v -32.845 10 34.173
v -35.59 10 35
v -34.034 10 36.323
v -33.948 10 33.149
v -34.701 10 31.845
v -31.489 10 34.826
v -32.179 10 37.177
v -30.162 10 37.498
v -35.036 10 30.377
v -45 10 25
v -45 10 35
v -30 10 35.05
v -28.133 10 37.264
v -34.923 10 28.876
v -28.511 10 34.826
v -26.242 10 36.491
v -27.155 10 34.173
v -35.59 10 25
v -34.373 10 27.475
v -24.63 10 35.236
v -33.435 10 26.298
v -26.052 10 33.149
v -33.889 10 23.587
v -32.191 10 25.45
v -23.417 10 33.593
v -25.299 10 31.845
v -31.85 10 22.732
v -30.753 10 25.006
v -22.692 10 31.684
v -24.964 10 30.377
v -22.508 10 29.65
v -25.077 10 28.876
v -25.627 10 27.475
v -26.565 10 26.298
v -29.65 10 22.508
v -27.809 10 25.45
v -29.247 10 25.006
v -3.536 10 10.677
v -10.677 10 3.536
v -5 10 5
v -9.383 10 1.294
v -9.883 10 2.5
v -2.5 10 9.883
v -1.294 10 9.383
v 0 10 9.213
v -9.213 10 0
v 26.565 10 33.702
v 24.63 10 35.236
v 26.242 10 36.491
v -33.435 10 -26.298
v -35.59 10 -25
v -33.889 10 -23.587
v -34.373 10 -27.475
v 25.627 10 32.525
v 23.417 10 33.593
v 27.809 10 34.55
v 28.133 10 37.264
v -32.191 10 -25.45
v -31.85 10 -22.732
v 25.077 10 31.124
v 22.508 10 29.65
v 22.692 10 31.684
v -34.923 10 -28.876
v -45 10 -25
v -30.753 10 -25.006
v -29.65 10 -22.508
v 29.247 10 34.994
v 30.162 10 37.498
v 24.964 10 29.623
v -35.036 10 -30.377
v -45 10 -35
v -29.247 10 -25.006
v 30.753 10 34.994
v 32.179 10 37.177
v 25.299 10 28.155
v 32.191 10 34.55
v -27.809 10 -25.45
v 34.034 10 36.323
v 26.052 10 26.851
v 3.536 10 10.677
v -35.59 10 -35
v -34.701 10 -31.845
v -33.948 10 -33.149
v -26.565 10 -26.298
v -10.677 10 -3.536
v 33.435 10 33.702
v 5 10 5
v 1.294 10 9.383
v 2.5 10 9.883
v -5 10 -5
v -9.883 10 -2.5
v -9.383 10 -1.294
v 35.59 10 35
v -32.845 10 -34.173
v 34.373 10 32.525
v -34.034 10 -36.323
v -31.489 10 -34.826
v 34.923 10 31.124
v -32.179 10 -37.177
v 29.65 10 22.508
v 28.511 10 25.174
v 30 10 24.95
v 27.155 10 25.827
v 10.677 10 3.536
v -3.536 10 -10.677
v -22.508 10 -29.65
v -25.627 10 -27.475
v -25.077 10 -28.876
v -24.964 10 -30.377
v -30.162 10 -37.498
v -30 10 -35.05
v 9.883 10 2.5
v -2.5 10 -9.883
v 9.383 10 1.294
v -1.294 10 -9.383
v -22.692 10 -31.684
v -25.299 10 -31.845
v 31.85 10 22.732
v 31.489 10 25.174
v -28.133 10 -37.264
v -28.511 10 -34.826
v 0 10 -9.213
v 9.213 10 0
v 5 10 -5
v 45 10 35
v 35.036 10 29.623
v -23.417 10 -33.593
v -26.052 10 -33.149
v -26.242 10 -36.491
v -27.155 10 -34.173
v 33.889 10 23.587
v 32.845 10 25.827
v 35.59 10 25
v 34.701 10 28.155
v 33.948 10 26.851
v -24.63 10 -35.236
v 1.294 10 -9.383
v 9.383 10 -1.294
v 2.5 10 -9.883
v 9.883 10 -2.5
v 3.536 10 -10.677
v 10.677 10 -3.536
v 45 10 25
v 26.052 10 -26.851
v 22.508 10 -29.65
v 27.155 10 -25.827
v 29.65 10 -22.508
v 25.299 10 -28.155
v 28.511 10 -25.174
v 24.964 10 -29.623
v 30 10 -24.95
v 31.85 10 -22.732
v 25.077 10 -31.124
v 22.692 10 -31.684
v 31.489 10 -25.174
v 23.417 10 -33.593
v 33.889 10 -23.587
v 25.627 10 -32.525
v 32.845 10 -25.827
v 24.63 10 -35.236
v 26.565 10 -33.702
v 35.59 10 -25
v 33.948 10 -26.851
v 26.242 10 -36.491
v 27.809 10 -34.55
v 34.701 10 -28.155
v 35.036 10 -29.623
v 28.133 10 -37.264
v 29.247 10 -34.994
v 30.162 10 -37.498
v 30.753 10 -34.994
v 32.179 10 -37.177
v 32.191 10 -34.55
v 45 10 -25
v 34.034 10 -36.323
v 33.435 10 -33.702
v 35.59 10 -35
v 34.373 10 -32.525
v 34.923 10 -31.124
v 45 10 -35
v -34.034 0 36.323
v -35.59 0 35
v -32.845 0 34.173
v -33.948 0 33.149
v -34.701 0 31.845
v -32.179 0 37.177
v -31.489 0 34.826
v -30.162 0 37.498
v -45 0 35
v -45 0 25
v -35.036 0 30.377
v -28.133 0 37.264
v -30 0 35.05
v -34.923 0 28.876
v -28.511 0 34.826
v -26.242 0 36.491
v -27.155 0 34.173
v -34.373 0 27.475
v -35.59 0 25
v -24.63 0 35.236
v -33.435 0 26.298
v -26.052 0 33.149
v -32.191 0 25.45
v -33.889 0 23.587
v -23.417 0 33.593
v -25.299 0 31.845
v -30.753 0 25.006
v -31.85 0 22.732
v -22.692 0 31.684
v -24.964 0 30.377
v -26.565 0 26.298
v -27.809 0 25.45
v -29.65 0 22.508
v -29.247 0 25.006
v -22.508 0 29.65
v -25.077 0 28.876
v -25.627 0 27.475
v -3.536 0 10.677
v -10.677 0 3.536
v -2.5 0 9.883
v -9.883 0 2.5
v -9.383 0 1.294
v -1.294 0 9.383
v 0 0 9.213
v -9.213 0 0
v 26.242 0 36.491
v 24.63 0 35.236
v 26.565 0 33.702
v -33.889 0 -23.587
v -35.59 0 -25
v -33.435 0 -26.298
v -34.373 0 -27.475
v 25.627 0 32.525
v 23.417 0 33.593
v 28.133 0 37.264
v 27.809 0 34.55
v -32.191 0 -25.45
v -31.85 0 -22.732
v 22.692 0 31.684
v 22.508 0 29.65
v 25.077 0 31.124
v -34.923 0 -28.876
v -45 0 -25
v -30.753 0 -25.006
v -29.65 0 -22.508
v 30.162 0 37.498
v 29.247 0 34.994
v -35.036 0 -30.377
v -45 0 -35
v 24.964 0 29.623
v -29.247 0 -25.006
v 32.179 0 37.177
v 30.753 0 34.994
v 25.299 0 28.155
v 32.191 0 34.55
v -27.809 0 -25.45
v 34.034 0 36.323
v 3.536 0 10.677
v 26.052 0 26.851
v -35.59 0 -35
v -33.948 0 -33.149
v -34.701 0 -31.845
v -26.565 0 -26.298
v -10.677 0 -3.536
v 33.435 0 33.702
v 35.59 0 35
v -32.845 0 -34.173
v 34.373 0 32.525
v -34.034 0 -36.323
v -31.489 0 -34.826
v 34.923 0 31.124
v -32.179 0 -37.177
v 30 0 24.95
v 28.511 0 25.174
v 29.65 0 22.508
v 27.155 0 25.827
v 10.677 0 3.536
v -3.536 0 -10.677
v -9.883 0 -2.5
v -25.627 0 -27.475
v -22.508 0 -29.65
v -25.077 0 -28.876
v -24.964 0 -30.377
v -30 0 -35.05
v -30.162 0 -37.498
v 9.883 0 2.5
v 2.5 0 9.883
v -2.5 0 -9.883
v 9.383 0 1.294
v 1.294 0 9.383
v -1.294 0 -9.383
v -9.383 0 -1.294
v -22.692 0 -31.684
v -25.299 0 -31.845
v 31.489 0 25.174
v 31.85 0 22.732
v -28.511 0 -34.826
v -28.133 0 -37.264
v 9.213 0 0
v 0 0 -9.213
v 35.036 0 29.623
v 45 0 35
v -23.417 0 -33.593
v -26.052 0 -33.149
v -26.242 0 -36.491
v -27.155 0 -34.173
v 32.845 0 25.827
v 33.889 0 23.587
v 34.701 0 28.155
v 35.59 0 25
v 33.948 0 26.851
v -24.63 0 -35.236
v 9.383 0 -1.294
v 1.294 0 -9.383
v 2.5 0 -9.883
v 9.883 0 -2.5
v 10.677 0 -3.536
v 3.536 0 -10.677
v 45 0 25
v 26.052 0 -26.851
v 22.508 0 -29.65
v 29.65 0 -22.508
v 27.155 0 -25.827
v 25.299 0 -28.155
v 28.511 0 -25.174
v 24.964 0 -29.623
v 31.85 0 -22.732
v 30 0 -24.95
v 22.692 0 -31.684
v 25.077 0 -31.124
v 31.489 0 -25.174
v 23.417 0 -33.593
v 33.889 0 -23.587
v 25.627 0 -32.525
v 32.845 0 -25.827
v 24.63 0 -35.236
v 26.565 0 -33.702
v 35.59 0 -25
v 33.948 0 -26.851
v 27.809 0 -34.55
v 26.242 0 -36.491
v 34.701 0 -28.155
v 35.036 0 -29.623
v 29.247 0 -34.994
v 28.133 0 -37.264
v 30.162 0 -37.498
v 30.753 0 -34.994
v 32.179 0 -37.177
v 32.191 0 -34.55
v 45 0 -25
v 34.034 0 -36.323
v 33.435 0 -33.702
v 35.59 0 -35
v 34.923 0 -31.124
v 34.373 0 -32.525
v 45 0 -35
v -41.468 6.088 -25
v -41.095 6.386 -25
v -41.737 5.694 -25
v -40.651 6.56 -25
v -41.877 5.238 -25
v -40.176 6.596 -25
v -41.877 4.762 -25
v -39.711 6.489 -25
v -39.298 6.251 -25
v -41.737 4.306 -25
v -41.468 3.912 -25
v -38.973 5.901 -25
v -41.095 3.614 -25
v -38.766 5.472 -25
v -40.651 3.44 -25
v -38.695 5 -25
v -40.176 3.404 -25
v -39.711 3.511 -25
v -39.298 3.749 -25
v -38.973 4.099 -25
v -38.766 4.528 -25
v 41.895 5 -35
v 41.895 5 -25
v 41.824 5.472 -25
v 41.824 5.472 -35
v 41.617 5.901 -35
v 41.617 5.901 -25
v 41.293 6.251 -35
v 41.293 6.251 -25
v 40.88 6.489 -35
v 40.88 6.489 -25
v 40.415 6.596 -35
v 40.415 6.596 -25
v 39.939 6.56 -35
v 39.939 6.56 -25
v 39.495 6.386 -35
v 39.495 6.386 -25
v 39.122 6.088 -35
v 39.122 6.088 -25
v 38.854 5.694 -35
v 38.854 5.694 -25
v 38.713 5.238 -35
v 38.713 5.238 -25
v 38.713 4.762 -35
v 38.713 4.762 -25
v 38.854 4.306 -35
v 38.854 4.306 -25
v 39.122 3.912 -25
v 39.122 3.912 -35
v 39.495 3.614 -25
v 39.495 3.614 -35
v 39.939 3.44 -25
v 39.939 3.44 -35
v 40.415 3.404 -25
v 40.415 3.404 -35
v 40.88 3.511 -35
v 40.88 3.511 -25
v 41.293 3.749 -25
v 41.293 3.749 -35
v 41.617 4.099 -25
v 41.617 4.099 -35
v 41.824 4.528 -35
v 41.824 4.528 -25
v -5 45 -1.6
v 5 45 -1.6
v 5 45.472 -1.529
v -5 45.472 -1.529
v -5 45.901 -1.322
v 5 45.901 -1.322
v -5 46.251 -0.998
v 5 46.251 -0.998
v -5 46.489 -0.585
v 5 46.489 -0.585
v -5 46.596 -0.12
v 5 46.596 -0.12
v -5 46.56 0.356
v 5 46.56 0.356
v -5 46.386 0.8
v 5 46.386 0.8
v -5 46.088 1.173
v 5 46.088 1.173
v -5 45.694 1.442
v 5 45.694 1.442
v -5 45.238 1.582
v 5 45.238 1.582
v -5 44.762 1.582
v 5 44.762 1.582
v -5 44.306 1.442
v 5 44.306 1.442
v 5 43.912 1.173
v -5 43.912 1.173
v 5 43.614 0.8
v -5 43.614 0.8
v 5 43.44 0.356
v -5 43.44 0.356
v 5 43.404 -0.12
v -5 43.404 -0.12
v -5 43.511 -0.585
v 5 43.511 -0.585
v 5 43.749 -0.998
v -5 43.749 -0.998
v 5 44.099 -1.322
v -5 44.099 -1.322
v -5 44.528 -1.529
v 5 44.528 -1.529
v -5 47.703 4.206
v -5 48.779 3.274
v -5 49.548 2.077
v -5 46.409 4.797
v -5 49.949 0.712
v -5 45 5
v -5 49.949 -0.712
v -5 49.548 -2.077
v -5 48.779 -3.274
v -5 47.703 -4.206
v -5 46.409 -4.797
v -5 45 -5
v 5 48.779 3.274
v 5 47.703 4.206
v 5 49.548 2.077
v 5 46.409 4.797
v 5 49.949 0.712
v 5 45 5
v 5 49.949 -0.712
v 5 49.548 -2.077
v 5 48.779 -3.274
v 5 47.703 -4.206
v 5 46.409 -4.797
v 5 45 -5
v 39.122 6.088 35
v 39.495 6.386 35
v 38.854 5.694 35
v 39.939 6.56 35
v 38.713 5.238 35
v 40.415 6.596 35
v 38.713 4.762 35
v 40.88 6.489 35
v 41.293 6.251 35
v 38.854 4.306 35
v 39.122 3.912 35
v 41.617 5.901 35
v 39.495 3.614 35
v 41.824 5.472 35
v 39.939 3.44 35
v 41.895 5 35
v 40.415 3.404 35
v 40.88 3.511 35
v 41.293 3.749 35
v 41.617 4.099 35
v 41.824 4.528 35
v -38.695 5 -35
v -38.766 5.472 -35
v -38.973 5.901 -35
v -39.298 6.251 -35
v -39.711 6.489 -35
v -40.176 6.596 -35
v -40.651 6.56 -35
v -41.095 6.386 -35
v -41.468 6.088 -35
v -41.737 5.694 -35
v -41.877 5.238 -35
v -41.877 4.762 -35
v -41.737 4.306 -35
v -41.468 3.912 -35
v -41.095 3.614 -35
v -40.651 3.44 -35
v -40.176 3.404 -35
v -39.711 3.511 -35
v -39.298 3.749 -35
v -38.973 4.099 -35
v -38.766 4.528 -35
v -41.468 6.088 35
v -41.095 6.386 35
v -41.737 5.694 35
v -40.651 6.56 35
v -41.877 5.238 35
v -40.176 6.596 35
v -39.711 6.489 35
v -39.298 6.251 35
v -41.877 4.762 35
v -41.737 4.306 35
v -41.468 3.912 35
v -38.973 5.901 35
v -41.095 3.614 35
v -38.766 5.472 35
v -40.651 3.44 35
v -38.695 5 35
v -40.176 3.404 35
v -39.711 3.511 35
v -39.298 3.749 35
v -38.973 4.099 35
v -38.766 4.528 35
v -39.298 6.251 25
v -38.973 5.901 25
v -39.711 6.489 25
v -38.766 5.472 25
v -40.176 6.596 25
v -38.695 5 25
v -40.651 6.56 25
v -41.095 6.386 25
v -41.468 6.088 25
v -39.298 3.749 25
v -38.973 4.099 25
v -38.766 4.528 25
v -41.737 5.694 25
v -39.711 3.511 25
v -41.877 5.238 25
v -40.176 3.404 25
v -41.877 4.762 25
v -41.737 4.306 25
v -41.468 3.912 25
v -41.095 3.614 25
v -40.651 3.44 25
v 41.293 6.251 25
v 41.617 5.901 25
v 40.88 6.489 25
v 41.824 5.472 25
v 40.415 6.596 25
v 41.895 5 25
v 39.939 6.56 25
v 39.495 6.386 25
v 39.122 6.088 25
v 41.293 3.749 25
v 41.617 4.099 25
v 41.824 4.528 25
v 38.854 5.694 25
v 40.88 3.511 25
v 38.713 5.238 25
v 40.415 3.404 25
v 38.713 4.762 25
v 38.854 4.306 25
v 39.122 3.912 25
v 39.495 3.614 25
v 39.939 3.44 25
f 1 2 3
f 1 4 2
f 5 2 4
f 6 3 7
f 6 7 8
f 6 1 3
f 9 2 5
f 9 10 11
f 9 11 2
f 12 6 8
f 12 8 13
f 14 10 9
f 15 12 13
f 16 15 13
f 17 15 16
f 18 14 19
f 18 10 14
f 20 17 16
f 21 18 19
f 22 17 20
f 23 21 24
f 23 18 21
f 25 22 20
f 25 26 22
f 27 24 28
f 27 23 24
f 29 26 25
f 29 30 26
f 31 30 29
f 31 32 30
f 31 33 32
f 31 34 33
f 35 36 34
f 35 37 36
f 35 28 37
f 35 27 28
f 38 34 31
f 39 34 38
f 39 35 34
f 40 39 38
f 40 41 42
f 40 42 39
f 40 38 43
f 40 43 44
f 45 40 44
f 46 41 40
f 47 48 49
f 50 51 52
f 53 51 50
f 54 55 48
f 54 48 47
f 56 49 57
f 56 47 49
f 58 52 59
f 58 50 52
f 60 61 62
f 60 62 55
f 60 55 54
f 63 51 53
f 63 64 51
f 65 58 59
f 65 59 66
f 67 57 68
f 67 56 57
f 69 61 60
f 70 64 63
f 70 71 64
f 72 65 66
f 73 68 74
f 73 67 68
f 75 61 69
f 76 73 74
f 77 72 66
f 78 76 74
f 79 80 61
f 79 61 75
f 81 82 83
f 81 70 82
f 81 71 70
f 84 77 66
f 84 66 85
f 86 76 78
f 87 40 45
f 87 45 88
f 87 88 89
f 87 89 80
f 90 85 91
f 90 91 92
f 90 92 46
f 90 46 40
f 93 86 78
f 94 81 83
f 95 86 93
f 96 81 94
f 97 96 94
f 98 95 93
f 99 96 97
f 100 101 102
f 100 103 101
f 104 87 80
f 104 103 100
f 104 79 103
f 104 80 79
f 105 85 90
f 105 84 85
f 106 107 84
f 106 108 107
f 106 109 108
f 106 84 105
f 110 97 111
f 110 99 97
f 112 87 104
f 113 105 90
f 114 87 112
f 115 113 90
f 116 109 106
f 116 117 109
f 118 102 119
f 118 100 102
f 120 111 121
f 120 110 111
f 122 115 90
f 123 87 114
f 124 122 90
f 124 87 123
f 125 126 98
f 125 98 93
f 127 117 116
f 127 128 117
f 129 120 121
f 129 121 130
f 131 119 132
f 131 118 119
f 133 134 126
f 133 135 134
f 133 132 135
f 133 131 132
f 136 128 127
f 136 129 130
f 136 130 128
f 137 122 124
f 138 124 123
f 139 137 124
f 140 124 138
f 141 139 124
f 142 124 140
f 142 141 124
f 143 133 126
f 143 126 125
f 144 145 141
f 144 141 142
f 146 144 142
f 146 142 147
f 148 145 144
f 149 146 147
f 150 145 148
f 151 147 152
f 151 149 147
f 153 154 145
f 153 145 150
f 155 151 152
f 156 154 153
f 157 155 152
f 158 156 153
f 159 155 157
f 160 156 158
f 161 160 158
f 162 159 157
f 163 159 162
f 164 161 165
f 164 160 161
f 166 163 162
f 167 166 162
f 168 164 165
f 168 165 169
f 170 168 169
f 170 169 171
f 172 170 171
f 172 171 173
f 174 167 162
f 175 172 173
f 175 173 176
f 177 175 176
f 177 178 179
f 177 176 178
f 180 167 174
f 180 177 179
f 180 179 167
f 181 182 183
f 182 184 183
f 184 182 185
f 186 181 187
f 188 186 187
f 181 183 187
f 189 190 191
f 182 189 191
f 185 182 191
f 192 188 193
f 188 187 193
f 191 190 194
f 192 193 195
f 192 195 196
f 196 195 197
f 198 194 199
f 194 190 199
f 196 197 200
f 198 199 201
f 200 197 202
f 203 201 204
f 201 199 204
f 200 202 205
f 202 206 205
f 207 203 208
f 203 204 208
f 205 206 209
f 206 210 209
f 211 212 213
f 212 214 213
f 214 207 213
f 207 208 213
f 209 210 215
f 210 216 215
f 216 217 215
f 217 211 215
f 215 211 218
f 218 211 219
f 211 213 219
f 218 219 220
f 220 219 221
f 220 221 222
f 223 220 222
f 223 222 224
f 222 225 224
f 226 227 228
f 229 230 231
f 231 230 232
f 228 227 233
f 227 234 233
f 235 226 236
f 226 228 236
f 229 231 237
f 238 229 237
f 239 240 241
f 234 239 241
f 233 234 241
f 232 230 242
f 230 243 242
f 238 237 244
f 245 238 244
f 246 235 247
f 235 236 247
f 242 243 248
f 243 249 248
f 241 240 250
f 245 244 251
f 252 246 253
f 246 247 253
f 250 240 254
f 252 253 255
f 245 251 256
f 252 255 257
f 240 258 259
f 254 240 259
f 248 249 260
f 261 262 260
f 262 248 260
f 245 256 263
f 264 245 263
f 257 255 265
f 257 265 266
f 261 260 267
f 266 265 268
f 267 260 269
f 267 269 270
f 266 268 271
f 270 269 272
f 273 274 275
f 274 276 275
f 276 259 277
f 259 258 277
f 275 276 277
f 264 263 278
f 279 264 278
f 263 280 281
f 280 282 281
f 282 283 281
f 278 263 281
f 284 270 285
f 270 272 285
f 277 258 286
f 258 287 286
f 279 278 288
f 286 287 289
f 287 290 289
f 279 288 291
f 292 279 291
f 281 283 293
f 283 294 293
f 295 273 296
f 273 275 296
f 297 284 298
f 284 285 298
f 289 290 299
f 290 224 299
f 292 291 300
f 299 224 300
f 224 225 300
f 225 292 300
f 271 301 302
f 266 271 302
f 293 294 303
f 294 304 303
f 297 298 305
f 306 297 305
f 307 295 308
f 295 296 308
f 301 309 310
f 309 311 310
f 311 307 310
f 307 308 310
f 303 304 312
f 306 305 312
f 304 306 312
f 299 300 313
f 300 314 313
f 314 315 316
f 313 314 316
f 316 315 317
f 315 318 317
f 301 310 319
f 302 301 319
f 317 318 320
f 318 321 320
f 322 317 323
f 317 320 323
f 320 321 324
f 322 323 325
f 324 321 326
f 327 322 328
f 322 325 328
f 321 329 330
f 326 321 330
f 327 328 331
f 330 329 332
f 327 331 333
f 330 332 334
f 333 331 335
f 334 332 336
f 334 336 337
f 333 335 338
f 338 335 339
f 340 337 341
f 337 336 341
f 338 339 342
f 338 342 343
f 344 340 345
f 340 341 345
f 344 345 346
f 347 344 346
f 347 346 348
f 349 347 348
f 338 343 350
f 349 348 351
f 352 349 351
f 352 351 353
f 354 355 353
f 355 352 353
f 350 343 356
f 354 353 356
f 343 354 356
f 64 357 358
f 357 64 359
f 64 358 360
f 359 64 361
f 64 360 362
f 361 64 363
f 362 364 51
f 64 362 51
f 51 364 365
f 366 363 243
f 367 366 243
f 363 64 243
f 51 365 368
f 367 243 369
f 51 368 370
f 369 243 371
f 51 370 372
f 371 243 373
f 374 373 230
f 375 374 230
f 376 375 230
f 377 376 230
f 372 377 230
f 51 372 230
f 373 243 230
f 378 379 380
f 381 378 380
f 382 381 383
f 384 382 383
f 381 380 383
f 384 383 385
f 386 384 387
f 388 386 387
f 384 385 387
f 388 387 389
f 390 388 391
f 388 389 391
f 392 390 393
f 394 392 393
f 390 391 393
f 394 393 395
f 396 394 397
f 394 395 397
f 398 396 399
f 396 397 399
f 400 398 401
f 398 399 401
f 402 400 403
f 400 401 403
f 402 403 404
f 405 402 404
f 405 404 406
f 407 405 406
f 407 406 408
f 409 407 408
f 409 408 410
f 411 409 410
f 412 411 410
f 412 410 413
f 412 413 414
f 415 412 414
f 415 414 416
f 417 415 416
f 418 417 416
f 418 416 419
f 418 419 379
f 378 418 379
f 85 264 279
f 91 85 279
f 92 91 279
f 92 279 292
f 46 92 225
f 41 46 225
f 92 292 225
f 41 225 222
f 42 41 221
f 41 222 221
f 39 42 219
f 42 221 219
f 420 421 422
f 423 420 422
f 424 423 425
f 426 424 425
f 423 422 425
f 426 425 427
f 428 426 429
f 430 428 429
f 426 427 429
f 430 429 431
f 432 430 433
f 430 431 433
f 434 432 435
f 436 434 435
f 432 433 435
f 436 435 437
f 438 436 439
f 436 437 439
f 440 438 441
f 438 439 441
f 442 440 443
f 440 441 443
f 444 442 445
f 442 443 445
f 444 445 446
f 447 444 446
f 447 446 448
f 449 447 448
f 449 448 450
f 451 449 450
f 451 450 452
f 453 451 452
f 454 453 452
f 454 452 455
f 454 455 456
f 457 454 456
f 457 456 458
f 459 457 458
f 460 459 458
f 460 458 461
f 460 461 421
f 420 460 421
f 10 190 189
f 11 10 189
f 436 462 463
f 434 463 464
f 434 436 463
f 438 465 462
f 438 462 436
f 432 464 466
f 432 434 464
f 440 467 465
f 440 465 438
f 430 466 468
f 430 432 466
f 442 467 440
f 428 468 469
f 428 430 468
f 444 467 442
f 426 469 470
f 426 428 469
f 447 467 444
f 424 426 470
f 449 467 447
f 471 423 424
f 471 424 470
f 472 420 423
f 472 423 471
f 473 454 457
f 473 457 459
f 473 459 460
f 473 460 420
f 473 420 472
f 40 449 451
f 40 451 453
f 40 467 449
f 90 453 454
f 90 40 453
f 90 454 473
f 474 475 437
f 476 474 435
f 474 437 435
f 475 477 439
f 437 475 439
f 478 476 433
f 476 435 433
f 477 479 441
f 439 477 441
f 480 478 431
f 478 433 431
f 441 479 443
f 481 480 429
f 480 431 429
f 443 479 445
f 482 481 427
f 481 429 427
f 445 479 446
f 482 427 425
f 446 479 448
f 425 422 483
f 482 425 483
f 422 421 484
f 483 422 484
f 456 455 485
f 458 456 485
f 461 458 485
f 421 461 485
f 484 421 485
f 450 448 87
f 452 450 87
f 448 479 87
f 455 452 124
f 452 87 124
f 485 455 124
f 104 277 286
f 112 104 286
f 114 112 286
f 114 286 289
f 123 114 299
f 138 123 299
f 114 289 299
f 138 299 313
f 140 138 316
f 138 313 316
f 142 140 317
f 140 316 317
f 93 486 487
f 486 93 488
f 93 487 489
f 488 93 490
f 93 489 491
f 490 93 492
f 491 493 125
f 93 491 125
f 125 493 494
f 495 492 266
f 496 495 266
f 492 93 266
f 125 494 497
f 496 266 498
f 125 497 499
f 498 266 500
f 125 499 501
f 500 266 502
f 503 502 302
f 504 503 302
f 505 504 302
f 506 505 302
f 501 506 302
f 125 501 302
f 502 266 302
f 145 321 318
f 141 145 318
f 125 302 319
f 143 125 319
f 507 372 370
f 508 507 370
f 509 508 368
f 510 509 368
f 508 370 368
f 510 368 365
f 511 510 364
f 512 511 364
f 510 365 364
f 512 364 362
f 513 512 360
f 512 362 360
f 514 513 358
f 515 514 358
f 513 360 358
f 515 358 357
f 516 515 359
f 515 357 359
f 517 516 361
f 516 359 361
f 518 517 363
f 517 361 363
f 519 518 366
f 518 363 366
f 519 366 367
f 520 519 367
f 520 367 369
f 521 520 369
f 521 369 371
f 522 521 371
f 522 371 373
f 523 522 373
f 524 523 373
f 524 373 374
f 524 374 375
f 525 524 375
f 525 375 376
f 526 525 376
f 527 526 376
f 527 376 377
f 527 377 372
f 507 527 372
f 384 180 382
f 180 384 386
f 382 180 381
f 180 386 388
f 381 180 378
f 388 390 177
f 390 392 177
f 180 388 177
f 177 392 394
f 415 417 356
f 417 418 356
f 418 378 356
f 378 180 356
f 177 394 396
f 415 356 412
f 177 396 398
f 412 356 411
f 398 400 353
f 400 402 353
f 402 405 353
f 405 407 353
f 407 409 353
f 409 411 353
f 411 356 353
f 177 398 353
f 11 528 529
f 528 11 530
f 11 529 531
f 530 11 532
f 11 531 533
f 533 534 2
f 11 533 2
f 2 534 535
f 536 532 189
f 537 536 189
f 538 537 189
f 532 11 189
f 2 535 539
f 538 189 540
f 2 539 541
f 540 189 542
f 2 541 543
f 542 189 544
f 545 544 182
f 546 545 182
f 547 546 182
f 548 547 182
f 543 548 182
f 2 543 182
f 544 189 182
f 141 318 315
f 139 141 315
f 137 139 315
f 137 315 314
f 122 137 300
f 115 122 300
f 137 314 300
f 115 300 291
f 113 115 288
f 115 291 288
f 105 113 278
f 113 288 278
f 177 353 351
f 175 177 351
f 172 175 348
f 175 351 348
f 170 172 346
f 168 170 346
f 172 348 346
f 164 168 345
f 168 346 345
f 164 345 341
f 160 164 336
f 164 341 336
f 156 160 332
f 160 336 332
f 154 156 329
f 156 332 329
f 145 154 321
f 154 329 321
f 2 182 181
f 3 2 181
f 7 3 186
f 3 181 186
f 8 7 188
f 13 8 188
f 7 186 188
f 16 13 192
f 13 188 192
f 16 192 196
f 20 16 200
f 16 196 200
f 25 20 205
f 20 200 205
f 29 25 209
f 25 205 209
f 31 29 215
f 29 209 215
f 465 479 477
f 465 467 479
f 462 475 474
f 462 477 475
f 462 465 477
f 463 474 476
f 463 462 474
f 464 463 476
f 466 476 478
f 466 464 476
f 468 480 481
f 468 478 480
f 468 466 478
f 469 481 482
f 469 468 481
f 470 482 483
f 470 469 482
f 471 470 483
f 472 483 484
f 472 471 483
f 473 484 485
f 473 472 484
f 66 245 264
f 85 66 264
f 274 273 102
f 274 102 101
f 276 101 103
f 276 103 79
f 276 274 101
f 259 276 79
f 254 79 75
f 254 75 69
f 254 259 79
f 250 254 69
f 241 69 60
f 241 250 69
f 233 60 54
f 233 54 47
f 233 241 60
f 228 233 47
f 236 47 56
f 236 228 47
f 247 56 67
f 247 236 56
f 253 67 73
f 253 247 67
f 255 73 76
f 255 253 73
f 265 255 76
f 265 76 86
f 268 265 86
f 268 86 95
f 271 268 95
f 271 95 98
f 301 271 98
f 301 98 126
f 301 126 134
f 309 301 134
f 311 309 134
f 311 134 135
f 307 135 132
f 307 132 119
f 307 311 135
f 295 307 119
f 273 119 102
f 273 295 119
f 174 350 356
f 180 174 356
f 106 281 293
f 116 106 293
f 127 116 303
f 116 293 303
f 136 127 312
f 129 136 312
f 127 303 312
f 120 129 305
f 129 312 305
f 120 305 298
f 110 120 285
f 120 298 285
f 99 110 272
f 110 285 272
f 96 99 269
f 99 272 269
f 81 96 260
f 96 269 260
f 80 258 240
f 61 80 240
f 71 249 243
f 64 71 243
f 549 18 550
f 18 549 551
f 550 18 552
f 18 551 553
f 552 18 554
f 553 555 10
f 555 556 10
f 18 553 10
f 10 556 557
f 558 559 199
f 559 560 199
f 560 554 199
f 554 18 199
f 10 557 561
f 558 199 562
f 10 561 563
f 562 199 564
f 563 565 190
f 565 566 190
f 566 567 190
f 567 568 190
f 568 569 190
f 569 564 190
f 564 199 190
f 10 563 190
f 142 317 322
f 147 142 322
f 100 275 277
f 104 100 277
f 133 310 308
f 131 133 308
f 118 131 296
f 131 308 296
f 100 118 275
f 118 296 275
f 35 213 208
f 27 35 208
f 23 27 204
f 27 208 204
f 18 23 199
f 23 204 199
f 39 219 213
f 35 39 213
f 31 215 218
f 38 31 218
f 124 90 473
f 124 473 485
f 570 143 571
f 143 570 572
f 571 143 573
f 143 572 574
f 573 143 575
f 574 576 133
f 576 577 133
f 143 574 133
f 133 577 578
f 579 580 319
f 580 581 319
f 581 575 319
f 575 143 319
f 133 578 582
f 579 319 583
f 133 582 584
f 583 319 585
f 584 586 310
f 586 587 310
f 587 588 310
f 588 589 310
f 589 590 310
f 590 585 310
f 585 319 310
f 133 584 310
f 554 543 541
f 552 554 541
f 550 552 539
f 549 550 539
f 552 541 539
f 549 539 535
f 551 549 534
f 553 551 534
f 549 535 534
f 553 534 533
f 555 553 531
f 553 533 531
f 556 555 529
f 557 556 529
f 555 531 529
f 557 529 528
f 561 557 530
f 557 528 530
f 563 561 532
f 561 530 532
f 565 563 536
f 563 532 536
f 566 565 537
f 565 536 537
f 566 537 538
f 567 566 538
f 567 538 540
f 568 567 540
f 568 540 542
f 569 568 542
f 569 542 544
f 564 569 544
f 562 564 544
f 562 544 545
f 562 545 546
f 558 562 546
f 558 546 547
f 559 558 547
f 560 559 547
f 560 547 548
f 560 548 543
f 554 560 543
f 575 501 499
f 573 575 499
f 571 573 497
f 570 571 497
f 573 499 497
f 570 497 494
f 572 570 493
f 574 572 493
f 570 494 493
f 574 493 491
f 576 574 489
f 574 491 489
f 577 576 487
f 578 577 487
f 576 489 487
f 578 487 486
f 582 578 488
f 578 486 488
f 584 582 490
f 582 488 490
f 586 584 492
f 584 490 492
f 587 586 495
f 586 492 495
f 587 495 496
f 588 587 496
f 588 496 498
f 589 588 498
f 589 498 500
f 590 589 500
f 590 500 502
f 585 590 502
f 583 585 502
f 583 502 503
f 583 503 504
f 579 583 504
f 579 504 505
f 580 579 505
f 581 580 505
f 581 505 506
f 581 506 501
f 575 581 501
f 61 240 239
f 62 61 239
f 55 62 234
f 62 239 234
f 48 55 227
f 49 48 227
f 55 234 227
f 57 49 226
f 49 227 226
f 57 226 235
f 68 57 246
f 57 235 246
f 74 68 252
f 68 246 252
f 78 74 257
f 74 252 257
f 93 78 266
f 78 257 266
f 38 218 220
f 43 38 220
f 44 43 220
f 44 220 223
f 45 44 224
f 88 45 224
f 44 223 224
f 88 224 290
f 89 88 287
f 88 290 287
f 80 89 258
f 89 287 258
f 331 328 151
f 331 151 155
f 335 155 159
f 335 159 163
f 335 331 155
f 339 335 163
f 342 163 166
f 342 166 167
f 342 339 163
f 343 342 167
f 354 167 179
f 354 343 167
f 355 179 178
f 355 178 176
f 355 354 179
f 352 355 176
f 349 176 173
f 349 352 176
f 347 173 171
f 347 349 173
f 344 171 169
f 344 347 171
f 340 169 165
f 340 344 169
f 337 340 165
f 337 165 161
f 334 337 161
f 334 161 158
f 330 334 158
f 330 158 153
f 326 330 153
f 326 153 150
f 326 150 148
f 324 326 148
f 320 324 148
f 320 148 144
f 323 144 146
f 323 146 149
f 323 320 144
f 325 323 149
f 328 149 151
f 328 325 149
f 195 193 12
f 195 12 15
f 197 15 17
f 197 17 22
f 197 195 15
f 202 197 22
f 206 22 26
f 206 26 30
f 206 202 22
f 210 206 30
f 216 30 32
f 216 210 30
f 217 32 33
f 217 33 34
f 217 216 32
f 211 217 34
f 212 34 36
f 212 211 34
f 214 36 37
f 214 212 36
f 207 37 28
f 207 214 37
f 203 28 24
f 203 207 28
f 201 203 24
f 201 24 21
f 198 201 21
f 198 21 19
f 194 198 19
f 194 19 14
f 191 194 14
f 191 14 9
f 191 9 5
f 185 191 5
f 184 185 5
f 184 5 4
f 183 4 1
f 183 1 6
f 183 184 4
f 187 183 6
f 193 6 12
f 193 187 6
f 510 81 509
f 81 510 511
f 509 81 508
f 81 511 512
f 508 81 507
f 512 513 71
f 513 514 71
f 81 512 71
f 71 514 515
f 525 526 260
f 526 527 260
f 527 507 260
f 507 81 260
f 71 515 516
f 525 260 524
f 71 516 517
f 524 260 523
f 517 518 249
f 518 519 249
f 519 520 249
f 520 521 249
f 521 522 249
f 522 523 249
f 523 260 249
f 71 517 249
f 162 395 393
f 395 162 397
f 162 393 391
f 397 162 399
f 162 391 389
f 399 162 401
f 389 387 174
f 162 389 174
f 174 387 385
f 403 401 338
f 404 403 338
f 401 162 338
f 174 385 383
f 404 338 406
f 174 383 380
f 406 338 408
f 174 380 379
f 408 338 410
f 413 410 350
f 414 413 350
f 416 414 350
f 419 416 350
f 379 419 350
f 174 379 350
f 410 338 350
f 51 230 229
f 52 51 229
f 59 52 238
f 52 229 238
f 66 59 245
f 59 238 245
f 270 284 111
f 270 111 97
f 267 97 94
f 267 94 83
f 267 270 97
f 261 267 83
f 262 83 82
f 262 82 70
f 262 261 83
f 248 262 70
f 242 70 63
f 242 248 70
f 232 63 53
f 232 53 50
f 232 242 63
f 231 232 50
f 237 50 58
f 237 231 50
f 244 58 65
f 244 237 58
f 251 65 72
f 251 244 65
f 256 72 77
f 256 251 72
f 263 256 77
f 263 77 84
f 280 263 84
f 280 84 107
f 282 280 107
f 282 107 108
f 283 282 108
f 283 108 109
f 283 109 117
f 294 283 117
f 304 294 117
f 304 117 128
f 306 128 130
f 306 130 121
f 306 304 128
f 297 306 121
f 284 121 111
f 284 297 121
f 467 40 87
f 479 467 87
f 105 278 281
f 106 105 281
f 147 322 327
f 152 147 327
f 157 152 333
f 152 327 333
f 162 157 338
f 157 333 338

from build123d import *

# Parameters (mm, degrees)
SKETCH_1_R          = 5.05
EXTRUDE_1_DEPTH     = 10
SKETCH_2_W          = 10
SKETCH_2_H          = 10
EXTRUDE_2_DEPTH     = 40
FILLET_3_RADIUS     = 5
FILLET_3_LENGTH     = 10
SKETCH_3_R          = 1.6
CUT_EXTRUDE_1_DEPTH = 81.039052968
SKETCH_4_R          = 1.6
CUT_EXTRUDE_2_DEPTH = 99.900202224


with BuildPart() as part:
    # ｽｹｯﾁ1 → ﾎﾞｽ - 押し出し1 (new body)
    with BuildSketch(Plane(origin=(0, 0, 0), x_dir=(1, 0, 0), z_dir=(0, 1, 0))):
        with BuildLine():
            Line((3.535533906, -10.677312396), (22.508173367, -29.649951857))
            ThreePointArc((22.508173367, -29.649951857), (27.161016322, -36.941914122), (35.590169944, -35))
            Line((35.590169944, -35), (45, -35))
            Line((45, -35), (45, -25))
            Line((45, -25), (35.590169944, -25))
            ThreePointArc((35.590169944, -25), (32.90120994, -23.08386084), (29.649951857, -22.508173367))
            Line((29.649951857, -22.508173367), (10.677312396, -3.535533906))
            ThreePointArc((10.677312396, -3.535533906), (9.212846302, 0), (10.677312396, 3.535533906))
            Line((10.677312396, 3.535533906), (29.649951857, 22.508173367))
            ThreePointArc((29.649951857, 22.508173367), (32.90120994, 23.08386084), (35.590169944, 25))
            Line((35.590169944, 25), (45, 25))
            Line((45, 25), (45, 35))
            Line((45, 35), (35.590169944, 35))
            ThreePointArc((35.590169944, 35), (27.161016322, 36.941914122), (22.508173367, 29.649951857))
            Line((22.508173367, 29.649951857), (3.535533906, 10.677312396))
            ThreePointArc((3.535533906, 10.677312396), (0, 9.212846302), (-3.535533906, 10.677312396))
            Line((-3.535533906, 10.677312396), (-22.508173367, 29.649951857))
            ThreePointArc((-22.508173367, 29.649951857), (-27.161016322, 36.941914122), (-35.590169944, 35))
            Line((-35.590169944, 35), (-45, 35))
            Line((-45, 35), (-45, 25))
            Line((-45, 25), (-35.590169944, 25))
            ThreePointArc((-35.590169944, 25), (-32.90120994, 23.08386084), (-29.649951857, 22.508173367))
            Line((-29.649951857, 22.508173367), (-10.677312396, 3.535533906))
            ThreePointArc((-10.677312396, 3.535533906), (-9.212846302, 0), (-10.677312396, -3.535533906))
            Line((-10.677312396, -3.535533906), (-29.649951857, -22.508173367))
            ThreePointArc((-29.649951857, -22.508173367), (-32.90120994, -23.08386084), (-35.590169944, -25))
            Line((-35.590169944, -25), (-45, -25))
            Line((-45, -25), (-45, -35))
            Line((-45, -35), (-35.590169944, -35))
            ThreePointArc((-35.590169944, -35), (-27.161016322, -36.941914122), (-22.508173367, -29.649951857))
            Line((-22.508173367, -29.649951857), (-3.535533906, -10.677312396))
            ThreePointArc((-3.535533906, -10.677312396), (0, -9.212846302), (3.535533906, -10.677312396))
        make_face()
        with Locations(Location((30, 30, 0), (0, 0, 270))):
            Circle(SKETCH_1_R, mode=Mode.SUBTRACT)
        with Locations(Location((-30, 30, 0), (0, 0, 90))):
            Circle(SKETCH_1_R, mode=Mode.SUBTRACT)
        with Locations(Location((30, -30, 0), (0, 0, 90))):
            Circle(SKETCH_1_R, mode=Mode.SUBTRACT)
        with Locations(Location((-30, -30, 0), (0, 0, 270))):
            Circle(SKETCH_1_R, mode=Mode.SUBTRACT)
    extrude(amount=EXTRUDE_1_DEPTH)

    # ｽｹｯﾁ2 → ﾎﾞｽ - 押し出し2 (add)
    with BuildSketch(Plane(origin=(0, 10, 0), x_dir=(1, 0, 0), z_dir=(0, 1, 0))):
        Rectangle(SKETCH_2_W, SKETCH_2_H)
    extrude(amount=EXTRUDE_2_DEPTH)

    # ﾌｨﾚｯﾄ3: full round fillet: the end face becomes a half cylinder, R = half its width
    fillet_3_face = Plane((0, 50, 0), x_dir=(-1, 0, 0), z_dir=(0, 1, 0))  # on the end face: x along it, z out of the body
    fillet_3_slab = fillet_3_face.offset(-FILLET_3_RADIUS / 2) * Box(FILLET_3_LENGTH, 2 * FILLET_3_RADIUS, FILLET_3_RADIUS, mode=Mode.PRIVATE)  # the body's end, R deep
    fillet_3_round = Plane((0, 45, 0), x_dir=(0, 1, 0), z_dir=(-1, 0, 0)) * Cylinder(FILLET_3_RADIUS, FILLET_3_LENGTH, mode=Mode.PRIVATE)  # its axis R under the face
    add(fillet_3_slab - fillet_3_round, mode=Mode.SUBTRACT)

    # ｽｹｯﾁ3 → ｶｯﾄ - 押し出し1 (cut, through all)
    with BuildSketch(Plane(origin=(5, 0, 0), x_dir=(0, 0, -1), z_dir=(1, 0, 0))):
        with Locations((0, 45)):
            Circle(SKETCH_3_R)
    extrude(amount=-CUT_EXTRUDE_1_DEPTH, mode=Mode.SUBTRACT)

    # ｽｹｯﾁ4 → ｶｯﾄ - 押し出し2 (cut, through all)
    with BuildSketch(Plane.XY.offset(35)):
        with Locations((-40.295084972, 5)):
            Circle(SKETCH_4_R)
        with Locations((40.295084972, 5)):
            Circle(SKETCH_4_R)
    extrude(amount=-CUT_EXTRUDE_2_DEPTH, mode=Mode.SUBTRACT)


solid = part.part
